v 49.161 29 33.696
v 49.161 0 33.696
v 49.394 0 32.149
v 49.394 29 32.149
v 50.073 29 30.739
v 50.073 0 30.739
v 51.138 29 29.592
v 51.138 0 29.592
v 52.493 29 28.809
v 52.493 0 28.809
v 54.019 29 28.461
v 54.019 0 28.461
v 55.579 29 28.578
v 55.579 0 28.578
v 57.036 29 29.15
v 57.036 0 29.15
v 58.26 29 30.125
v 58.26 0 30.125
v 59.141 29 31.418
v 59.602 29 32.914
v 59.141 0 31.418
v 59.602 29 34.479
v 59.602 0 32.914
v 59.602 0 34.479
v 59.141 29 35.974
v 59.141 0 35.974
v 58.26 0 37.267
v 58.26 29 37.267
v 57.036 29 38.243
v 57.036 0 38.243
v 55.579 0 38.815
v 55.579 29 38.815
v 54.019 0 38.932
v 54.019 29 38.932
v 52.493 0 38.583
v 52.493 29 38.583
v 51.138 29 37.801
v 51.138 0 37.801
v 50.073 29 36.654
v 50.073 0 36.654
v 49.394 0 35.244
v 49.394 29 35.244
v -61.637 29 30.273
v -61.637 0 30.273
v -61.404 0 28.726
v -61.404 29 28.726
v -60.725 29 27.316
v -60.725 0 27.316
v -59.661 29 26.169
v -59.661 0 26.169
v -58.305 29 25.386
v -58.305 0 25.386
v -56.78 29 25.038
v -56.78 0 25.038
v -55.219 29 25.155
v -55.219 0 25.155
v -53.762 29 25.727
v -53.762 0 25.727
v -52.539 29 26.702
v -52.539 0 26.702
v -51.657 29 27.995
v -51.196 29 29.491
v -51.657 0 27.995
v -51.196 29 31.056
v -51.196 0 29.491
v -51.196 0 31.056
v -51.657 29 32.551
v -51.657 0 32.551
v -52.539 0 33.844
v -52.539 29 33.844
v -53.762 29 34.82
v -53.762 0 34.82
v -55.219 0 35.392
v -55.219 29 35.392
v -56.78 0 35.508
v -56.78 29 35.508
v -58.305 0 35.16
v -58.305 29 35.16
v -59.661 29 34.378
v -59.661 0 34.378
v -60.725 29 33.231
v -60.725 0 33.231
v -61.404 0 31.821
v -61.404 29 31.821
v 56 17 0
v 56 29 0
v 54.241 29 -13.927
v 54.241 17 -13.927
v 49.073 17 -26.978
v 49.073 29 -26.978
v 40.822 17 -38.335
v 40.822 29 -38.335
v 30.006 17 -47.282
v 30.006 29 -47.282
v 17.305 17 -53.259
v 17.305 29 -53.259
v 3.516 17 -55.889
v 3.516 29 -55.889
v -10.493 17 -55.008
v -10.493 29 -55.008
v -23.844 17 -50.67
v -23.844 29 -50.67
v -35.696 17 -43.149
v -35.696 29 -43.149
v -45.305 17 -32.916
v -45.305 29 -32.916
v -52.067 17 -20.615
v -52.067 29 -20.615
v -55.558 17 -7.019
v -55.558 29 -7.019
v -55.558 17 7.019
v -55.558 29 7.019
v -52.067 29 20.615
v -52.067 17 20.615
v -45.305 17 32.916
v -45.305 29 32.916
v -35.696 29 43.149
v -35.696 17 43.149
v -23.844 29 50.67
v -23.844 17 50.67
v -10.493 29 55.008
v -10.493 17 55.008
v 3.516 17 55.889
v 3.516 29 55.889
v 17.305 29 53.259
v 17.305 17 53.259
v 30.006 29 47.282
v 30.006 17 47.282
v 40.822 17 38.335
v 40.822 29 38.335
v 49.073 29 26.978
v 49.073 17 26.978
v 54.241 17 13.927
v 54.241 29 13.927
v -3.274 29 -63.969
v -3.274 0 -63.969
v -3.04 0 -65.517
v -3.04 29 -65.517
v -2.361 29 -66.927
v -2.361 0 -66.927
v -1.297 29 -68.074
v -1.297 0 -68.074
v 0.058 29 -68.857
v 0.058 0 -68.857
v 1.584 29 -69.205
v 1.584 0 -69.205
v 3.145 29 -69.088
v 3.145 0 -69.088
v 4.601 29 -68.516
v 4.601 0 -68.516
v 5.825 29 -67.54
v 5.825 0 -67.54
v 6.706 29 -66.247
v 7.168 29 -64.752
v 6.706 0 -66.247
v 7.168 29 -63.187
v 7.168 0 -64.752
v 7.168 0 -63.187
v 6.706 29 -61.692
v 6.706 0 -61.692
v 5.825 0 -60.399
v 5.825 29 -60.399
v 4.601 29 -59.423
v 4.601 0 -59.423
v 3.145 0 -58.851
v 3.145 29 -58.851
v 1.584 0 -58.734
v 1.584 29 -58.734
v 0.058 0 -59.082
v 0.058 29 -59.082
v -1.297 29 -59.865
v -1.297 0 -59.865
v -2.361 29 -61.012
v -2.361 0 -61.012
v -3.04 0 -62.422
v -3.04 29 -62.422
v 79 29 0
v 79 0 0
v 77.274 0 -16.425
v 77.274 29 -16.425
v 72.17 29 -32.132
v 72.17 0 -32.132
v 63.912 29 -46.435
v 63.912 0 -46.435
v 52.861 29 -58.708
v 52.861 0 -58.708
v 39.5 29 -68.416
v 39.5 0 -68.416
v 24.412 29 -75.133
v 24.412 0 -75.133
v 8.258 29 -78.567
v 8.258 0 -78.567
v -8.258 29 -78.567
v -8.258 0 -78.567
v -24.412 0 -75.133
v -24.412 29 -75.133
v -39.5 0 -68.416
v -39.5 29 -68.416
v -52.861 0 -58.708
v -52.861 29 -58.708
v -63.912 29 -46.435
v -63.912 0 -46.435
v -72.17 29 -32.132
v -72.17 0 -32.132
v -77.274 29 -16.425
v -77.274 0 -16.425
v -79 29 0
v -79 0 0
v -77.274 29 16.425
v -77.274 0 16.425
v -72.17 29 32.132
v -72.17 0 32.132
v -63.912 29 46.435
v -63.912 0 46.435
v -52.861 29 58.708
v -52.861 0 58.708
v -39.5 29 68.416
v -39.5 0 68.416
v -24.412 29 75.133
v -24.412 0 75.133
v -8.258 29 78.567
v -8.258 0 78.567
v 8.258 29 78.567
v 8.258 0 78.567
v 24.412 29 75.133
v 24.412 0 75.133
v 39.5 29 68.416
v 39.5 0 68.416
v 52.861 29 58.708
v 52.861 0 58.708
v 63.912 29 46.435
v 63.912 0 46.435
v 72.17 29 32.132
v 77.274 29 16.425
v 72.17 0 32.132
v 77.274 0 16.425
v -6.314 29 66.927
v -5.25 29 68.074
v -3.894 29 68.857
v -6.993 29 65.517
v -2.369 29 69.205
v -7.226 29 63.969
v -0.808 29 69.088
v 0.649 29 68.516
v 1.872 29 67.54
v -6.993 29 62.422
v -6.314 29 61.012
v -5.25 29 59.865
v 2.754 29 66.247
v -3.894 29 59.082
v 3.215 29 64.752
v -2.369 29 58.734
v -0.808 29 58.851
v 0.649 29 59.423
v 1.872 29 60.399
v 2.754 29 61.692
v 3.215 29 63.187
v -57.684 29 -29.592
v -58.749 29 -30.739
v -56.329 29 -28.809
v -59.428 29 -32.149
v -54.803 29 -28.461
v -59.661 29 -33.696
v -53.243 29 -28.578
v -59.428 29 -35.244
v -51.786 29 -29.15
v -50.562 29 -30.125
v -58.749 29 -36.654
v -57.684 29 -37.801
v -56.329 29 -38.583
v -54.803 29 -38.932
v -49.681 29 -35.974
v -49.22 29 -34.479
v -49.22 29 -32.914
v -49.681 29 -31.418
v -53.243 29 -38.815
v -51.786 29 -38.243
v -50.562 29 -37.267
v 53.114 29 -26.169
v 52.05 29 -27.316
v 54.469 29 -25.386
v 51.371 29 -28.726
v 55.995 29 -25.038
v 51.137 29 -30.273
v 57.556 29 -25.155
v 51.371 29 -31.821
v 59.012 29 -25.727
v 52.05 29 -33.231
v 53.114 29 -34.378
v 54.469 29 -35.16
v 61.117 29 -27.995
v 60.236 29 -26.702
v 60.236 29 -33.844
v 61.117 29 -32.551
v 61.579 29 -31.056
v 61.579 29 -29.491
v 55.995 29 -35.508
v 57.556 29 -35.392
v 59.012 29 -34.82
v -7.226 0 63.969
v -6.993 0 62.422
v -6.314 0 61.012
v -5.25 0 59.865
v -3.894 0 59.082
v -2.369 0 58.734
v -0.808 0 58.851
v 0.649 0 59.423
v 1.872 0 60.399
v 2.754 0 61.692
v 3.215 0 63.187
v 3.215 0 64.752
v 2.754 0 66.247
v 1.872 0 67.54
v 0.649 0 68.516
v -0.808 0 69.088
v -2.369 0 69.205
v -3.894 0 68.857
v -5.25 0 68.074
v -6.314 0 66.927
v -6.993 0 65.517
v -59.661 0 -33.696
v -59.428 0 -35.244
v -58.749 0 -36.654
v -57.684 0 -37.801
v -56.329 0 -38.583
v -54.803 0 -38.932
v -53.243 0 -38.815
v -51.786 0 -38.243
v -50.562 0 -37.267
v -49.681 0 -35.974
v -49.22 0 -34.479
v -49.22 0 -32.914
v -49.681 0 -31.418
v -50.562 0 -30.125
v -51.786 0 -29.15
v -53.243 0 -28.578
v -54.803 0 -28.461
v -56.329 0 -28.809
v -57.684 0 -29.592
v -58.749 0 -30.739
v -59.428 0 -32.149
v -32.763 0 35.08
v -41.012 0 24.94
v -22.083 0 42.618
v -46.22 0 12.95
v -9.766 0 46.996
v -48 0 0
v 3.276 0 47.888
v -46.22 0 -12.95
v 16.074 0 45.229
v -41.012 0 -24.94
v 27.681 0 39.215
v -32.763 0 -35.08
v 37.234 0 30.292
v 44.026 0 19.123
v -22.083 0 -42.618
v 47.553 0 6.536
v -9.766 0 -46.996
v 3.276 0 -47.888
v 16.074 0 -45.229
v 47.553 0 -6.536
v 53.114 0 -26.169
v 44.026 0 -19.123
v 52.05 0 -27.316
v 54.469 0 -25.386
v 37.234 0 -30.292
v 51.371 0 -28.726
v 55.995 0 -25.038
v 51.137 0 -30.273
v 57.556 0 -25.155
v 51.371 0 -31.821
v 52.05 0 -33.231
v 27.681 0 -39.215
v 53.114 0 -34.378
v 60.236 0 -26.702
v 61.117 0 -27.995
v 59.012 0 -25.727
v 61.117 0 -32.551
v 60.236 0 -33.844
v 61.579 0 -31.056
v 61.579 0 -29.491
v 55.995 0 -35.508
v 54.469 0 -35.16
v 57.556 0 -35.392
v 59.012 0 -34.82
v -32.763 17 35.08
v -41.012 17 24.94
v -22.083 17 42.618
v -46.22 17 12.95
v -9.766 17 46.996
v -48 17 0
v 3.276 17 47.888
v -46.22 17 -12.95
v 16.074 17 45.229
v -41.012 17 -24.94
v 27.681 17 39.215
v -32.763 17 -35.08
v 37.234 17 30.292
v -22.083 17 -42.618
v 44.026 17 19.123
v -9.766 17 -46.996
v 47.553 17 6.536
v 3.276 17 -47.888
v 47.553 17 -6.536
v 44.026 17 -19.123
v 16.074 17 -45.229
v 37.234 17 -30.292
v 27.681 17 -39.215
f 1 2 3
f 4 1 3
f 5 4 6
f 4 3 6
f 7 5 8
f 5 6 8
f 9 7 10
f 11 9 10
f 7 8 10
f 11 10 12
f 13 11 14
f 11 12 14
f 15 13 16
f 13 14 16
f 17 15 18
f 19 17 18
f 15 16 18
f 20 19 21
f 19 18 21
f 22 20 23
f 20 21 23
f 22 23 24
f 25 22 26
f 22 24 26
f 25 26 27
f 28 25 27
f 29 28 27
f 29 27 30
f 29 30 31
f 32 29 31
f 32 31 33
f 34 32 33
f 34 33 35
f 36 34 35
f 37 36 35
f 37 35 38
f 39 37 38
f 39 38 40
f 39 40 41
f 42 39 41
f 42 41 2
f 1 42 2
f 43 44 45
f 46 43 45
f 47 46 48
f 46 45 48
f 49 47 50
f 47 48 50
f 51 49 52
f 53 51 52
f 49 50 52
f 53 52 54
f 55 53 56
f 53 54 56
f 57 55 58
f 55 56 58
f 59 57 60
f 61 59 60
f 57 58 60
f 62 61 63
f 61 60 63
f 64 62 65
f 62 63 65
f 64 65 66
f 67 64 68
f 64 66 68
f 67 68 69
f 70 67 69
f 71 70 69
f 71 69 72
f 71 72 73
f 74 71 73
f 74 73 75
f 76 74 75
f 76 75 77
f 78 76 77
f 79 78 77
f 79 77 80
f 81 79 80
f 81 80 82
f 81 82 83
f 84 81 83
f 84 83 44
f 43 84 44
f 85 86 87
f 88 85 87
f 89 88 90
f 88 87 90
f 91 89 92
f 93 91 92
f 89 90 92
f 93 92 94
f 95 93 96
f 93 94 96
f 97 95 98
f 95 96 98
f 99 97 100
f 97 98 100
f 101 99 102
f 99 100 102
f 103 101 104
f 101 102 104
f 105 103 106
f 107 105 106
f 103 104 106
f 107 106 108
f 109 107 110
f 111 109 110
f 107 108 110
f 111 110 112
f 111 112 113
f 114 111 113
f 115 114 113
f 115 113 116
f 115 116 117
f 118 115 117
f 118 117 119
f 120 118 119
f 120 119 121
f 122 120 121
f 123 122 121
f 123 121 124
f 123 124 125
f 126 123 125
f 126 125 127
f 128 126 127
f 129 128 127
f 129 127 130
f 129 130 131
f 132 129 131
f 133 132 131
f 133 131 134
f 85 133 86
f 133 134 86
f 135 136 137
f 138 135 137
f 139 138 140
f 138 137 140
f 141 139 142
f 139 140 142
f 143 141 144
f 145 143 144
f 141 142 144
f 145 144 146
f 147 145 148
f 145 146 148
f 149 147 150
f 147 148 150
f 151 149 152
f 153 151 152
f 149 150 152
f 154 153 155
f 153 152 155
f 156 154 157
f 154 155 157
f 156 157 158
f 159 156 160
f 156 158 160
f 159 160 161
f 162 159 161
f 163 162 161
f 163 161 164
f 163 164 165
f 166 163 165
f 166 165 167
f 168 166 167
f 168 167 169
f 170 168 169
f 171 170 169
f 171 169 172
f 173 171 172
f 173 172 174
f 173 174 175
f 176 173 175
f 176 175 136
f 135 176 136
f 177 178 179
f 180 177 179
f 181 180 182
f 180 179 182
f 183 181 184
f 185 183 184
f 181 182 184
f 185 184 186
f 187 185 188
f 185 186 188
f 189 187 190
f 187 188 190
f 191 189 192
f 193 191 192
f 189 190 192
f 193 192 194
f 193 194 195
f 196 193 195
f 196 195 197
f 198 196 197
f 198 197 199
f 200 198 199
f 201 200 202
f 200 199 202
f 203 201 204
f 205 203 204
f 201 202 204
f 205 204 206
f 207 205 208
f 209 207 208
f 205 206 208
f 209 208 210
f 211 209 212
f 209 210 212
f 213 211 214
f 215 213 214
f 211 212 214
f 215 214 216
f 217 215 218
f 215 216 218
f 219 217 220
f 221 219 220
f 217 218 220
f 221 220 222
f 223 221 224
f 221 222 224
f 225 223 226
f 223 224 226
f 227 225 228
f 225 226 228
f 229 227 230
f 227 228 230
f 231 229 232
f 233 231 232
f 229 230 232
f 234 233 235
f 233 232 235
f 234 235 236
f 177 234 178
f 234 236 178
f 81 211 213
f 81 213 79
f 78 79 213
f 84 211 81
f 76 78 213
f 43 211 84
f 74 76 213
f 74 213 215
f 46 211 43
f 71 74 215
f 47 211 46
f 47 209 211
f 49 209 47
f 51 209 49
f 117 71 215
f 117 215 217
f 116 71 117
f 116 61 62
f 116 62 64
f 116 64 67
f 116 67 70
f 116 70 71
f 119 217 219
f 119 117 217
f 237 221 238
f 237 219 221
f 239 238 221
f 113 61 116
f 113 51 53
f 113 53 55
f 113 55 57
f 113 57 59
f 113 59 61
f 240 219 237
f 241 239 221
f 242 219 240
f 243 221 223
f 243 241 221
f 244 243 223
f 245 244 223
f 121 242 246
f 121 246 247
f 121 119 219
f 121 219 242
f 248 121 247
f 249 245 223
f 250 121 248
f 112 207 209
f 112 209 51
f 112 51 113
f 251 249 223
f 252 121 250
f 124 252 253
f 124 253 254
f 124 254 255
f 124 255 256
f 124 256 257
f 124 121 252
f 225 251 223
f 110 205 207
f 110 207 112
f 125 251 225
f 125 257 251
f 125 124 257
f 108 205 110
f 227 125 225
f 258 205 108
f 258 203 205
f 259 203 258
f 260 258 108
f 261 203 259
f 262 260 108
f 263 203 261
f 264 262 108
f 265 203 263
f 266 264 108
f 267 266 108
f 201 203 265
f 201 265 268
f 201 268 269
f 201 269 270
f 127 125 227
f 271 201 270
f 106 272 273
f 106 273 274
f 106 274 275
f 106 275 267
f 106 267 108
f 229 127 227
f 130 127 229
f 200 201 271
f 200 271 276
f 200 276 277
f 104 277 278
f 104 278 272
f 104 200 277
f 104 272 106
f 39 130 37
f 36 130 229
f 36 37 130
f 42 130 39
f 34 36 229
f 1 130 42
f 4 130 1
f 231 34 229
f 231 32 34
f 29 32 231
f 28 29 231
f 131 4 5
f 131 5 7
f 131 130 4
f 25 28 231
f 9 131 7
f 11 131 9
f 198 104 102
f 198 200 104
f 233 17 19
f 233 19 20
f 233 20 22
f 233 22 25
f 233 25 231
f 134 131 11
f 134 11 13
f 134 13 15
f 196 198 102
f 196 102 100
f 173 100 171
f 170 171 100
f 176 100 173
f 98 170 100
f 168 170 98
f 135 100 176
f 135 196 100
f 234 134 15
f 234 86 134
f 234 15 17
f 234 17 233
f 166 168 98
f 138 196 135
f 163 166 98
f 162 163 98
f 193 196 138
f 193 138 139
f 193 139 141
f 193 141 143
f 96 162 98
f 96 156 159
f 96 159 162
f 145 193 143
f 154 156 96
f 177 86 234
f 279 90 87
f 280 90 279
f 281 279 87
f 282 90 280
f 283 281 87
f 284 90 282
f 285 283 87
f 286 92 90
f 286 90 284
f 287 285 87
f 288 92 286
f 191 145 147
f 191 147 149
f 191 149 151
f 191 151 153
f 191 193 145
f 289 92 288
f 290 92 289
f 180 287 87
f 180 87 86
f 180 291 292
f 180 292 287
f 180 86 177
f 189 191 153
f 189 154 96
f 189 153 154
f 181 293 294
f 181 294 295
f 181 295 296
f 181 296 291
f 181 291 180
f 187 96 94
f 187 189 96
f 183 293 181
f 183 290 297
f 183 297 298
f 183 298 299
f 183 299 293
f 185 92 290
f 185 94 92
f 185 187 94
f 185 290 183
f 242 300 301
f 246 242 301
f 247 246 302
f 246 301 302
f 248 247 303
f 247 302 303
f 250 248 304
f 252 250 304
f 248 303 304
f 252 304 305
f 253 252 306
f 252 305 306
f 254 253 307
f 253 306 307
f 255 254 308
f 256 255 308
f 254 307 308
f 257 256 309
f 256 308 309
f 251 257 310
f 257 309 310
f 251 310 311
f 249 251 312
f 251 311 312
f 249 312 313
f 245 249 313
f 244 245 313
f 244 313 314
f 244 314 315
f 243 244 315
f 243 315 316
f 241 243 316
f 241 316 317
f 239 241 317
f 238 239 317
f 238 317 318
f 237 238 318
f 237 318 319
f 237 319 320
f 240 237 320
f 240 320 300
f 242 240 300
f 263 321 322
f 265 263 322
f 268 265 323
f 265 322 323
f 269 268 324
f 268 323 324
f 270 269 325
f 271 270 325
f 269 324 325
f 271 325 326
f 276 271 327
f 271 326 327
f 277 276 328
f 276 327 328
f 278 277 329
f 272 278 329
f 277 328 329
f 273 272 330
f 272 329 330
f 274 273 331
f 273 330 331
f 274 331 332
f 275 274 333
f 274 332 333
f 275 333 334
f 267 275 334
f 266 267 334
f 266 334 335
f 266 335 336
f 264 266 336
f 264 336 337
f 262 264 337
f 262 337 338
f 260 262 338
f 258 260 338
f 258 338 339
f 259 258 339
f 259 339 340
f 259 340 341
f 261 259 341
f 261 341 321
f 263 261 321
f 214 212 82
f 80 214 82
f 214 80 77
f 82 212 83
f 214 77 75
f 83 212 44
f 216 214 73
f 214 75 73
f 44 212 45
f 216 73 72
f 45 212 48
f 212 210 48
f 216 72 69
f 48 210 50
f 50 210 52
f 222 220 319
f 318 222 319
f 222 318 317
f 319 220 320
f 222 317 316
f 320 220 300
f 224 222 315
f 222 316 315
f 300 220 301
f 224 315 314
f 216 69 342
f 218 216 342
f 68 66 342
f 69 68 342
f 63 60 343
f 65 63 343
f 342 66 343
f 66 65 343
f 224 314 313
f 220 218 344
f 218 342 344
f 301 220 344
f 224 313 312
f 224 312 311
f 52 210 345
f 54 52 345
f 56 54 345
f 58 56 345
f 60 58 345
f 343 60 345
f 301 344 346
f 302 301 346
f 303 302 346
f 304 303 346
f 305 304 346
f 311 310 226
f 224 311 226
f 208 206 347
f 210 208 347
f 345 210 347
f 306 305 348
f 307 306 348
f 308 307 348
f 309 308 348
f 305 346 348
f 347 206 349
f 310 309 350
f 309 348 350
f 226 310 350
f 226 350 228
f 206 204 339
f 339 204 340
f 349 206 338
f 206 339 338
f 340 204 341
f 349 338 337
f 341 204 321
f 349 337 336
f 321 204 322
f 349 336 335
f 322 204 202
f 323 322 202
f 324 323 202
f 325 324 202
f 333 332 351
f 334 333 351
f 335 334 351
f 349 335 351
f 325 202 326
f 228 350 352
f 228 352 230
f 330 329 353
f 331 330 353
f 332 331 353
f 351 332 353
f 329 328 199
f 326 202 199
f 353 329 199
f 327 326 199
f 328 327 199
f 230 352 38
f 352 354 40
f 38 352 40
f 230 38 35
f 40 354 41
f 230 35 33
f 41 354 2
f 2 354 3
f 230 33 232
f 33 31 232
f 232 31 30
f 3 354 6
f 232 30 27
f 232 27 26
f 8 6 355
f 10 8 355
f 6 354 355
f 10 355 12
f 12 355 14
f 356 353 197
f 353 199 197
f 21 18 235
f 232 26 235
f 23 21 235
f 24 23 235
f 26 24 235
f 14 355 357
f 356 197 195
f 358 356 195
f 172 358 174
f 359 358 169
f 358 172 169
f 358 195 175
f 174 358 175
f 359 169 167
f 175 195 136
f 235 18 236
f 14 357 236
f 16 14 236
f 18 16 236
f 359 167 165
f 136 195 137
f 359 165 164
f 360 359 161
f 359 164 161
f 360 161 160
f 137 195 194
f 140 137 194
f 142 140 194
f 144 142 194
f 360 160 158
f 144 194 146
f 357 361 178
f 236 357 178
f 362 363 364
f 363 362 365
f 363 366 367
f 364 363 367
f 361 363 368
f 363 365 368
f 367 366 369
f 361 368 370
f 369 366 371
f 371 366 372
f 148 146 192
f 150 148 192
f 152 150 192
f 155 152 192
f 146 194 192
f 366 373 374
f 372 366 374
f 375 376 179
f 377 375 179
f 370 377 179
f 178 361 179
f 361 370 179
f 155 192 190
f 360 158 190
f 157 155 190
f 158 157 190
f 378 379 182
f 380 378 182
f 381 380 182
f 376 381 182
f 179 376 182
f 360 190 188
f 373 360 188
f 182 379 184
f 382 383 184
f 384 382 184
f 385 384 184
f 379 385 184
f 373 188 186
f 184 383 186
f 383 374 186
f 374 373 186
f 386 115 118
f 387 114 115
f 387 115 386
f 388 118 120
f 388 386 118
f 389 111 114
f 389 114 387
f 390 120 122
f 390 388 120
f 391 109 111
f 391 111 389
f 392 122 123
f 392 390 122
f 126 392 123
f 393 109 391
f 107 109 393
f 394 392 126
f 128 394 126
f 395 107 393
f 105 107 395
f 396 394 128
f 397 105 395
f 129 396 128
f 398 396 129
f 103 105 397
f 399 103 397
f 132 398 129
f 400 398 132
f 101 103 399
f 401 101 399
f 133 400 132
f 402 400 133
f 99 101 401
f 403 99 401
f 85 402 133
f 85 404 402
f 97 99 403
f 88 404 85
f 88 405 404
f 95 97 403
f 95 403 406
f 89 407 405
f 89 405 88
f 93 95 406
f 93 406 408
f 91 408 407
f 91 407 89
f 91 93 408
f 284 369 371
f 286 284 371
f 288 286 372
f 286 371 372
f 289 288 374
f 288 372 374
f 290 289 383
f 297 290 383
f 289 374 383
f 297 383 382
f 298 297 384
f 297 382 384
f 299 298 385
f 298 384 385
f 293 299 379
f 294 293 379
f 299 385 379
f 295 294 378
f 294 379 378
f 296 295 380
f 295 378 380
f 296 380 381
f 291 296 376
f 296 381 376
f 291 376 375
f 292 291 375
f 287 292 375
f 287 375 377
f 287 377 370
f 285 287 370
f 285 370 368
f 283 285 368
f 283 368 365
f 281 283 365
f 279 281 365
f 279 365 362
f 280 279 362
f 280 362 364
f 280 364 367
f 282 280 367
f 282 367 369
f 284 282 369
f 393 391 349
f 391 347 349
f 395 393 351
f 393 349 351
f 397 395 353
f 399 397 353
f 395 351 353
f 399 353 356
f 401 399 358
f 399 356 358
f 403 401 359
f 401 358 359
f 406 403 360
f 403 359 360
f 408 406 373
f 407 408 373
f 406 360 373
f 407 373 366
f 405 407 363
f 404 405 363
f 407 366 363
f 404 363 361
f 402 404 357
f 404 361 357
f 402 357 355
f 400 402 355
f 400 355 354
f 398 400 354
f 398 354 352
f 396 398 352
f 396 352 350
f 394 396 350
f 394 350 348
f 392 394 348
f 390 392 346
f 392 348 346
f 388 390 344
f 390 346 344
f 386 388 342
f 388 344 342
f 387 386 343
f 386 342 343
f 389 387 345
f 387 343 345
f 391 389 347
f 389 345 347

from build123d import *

# Parameters (mm, degrees)
SKETCH1_R                                           = 79
BOSS_EXTRUDE1_DEPTH                                 = 29
CBORE_FOR_00_BINDING_HEAD_MACHINE_SCREW_D           = 96.000000024
CBORE_FOR_00_BINDING_HEAD_MACHINE_SCREW_CBORE_D     = 112.000000028
CBORE_FOR_00_BINDING_HEAD_MACHINE_SCREW_CBORE_DEPTH = 11.999999876
TAP_DRILL_FOR_M12X1_5_TAP2_D                        = 10.5


with BuildPart() as part:
    # Sketch1 → Boss-Extrude1 (new body)
    with BuildSketch(Plane(origin=(0, 0, 0), x_dir=(1, 0, 0), z_dir=(0, 1, 0))):
        Circle(SKETCH1_R)
    extrude(amount=BOSS_EXTRUDE1_DEPTH)

    # CBORE for #00 Binding Head Machine Screw1 (through all)
    with Locations(Plane(origin=(0, 29, 0), x_dir=(1, 0, 0), z_dir=(0, 1, 0))):
        with Locations((0, 0)):
            CounterBoreHole(CBORE_FOR_00_BINDING_HEAD_MACHINE_SCREW_D / 2, CBORE_FOR_00_BINDING_HEAD_MACHINE_SCREW_CBORE_D / 2, CBORE_FOR_00_BINDING_HEAD_MACHINE_SCREW_CBORE_DEPTH)

    # Tap Drill for M12x1.5 Tap2 (through all)
    with Locations(Plane(origin=(0, 29, 0), x_dir=(1, 0, 0), z_dir=(0, 1, 0))):
        with Locations((54.411006739, -33.696325403), (-1.976370444, -63.969476783), (-56.387377183, -30.27315138), (-54.411006739, 33.696325403), (1.976370444, 63.969476783), (56.387377183, 30.27315138), (0, 0)):
            Hole(TAP_DRILL_FOR_M12X1_5_TAP2_D / 2)


solid = part.part
